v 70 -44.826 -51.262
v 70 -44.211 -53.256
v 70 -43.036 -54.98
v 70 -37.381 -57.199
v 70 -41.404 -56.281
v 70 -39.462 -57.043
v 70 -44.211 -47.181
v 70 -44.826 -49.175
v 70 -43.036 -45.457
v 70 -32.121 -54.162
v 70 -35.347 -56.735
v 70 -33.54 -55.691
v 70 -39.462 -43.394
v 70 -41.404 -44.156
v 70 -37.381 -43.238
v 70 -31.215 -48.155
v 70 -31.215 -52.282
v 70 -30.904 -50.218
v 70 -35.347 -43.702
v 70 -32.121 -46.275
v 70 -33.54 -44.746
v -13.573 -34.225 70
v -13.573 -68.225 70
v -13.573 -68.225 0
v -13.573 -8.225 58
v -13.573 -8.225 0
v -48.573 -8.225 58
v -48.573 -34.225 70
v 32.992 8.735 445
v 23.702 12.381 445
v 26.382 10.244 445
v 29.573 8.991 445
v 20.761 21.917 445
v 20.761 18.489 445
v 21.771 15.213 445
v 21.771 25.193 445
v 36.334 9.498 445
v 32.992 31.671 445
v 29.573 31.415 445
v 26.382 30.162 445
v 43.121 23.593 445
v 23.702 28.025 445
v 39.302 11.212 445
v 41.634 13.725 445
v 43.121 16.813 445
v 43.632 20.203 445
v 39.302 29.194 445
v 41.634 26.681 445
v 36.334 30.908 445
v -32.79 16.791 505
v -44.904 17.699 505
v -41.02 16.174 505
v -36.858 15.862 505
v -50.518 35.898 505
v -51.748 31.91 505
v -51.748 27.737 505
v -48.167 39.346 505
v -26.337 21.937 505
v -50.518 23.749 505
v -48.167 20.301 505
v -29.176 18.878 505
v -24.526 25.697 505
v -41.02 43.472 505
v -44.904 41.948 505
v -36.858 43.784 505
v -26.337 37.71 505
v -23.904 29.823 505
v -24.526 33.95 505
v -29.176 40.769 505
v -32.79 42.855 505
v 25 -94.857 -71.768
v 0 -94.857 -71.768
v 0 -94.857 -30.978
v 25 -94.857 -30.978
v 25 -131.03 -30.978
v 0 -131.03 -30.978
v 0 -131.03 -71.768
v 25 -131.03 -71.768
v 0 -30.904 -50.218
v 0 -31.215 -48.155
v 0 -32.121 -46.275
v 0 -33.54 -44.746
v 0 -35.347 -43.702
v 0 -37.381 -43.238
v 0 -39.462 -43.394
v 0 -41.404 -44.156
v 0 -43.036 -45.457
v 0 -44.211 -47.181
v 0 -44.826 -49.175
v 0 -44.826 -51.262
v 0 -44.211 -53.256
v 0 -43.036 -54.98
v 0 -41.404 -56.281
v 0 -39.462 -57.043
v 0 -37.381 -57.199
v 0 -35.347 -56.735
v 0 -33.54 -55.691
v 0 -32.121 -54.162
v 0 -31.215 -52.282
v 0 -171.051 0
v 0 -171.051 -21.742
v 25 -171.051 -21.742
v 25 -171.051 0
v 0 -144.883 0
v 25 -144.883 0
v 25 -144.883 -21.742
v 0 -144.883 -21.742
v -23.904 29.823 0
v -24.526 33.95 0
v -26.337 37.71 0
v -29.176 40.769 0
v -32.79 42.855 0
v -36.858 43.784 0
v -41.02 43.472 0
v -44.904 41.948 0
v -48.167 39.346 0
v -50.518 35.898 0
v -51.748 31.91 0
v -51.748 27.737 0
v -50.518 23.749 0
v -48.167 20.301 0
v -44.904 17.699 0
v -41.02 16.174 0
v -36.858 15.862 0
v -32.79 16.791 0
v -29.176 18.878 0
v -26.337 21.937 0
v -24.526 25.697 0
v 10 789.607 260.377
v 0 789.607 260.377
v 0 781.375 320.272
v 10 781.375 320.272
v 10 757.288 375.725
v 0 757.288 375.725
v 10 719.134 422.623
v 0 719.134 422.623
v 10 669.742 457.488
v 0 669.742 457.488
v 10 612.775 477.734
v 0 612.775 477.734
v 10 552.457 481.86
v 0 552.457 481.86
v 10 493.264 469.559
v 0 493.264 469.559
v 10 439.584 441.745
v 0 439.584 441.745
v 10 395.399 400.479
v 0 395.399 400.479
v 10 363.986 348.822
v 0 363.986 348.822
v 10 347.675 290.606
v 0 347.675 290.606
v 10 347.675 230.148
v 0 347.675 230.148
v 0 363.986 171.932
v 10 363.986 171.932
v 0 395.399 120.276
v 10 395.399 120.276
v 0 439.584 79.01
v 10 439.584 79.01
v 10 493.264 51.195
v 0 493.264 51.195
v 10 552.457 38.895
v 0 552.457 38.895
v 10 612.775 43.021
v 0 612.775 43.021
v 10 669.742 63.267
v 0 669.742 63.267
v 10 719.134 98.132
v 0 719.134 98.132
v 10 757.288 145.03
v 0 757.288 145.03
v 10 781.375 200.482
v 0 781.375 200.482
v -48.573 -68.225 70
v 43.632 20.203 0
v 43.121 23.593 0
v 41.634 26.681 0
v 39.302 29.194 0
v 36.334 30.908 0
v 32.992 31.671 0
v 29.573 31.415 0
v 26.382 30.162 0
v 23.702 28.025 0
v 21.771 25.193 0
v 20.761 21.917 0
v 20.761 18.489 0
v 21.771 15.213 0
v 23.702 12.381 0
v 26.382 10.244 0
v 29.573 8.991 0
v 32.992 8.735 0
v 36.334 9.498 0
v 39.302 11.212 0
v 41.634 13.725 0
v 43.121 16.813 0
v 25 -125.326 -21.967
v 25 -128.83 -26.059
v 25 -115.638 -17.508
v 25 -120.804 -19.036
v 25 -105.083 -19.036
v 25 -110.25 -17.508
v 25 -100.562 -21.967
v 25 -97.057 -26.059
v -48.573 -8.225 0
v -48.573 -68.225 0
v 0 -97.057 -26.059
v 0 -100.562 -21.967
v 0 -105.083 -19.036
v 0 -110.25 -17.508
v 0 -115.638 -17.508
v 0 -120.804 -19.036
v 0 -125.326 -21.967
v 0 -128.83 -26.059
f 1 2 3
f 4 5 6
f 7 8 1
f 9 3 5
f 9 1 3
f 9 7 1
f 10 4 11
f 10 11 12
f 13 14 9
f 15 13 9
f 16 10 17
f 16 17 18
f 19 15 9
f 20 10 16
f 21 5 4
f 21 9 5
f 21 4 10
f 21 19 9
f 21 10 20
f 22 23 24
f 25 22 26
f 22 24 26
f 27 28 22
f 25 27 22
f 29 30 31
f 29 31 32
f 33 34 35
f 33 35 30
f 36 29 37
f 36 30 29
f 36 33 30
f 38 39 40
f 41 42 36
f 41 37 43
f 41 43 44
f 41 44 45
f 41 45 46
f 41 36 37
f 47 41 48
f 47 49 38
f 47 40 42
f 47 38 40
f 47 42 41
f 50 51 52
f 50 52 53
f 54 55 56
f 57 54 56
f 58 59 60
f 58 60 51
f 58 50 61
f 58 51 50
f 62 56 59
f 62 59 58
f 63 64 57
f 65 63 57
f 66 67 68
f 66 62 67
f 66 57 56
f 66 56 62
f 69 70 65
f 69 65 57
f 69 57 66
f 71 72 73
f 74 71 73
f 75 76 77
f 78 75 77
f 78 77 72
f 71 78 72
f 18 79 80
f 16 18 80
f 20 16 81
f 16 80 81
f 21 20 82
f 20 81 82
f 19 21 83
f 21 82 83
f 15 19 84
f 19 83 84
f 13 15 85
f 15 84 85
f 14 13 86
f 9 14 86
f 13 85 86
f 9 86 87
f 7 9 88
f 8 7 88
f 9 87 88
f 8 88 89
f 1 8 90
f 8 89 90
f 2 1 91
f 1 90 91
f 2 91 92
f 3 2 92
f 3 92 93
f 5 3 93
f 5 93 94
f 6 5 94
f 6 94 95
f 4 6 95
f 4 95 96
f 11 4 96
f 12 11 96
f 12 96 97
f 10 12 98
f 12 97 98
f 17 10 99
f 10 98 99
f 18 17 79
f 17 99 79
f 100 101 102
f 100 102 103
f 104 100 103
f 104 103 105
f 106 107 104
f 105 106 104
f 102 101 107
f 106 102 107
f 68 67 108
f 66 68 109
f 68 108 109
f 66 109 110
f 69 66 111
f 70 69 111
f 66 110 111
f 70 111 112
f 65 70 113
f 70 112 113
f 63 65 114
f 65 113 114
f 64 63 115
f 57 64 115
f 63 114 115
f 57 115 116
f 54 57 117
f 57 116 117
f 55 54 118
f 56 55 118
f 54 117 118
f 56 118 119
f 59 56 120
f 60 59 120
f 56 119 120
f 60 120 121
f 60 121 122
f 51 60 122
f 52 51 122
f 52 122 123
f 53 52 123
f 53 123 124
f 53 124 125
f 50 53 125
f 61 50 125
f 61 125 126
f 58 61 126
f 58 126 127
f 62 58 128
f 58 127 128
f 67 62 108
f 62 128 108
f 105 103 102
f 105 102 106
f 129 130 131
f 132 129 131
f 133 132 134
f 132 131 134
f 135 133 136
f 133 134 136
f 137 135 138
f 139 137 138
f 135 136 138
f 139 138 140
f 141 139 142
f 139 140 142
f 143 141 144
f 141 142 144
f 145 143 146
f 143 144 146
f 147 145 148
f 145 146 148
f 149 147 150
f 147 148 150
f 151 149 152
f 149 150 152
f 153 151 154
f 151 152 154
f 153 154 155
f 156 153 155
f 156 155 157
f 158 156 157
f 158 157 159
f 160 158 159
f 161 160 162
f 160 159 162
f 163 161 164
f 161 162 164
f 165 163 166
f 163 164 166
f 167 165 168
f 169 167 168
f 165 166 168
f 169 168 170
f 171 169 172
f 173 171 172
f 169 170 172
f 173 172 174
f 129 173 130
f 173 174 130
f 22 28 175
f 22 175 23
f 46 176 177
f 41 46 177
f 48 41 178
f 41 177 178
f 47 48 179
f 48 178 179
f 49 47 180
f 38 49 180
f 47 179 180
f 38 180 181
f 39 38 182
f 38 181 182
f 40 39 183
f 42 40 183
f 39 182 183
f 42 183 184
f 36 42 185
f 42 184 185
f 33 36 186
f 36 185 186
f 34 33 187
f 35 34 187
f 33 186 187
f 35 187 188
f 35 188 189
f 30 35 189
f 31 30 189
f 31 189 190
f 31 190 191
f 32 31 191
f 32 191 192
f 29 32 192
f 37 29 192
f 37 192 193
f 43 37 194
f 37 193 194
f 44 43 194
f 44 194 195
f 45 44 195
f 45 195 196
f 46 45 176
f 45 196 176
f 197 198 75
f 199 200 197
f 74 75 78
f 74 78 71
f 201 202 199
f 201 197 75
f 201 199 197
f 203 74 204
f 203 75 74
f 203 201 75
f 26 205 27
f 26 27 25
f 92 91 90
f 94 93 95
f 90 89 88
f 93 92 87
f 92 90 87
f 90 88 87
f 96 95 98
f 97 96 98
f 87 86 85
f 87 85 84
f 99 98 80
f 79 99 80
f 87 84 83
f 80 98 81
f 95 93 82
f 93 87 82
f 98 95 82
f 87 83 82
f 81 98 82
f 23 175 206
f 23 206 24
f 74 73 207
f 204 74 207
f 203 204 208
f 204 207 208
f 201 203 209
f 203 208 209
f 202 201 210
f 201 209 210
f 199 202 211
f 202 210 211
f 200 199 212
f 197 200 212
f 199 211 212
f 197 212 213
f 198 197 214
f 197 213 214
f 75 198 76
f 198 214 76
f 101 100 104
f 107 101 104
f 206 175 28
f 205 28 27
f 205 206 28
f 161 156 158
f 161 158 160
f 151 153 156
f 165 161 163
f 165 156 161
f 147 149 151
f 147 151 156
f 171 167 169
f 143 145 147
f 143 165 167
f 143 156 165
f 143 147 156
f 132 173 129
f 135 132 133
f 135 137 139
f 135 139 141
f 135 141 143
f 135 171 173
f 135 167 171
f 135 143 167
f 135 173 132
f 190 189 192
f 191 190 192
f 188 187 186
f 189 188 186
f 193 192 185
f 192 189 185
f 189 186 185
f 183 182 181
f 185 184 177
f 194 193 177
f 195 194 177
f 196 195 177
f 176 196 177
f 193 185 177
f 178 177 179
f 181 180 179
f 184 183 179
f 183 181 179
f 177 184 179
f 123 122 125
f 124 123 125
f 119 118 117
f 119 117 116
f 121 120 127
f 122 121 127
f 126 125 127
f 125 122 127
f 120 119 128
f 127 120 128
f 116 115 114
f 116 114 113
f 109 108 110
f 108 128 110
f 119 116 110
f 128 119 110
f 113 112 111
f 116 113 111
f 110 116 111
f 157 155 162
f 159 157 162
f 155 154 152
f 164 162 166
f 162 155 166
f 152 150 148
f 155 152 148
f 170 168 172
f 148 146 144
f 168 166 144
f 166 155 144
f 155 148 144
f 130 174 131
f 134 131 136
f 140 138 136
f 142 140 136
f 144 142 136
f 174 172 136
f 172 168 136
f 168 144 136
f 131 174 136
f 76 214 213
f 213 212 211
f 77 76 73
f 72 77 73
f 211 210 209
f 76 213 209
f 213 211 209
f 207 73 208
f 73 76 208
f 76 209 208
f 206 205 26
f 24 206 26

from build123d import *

# Parameters (mm, degrees)
F0_R      = 14
F1_DEPTH  = 505
F2_R      = 11.5
F3_DEPTH  = 445
F4_W      = 35
F4_H      = 60
F5_DEPTH  = 70
F6_SIZE2  = 26
F6_SIZE   = 12
F7_R      = 7
F8_DEPTH  = 70
F11_DEPTH = 25
F10_W     = 26.167509
F10_H     = 21.742089
F12_DEPTH = 25
F13_R     = 222
F14_DEPTH = 10


with BuildPart() as f1:
    # F0 (on Top) → F1 (new body)
    with BuildSketch(Plane.XY):
        with Locations((-37.904397, 29.823253)):
            Circle(F0_R)
    extrude(amount=F1_DEPTH)


with BuildPart() as f3:
    # F2 (on Top) → F3 (new body)
    with BuildSketch(Plane.XY):
        with Locations((32.132167, 20.202847)):
            Circle(F2_R)
    extrude(amount=F3_DEPTH)


with BuildPart() as f5:
    # F4 (on Top) → F5 (new body)
    with BuildSketch(Plane.XY):
        with Locations((-31.072771, -38.224626)):
            Rectangle(F4_W, F4_H)
    extrude(amount=F5_DEPTH)

    # F6
    f6_edges = [f5.edges().sort_by_distance(p)[0] for p in [
        (-31.072771, -8.224626, 70),
    ]]
    chamfer(f6_edges, length=F6_SIZE, length2=F6_SIZE2)


with BuildPart() as f8:
    # F7 (on Right) → F8 (new body)
    with BuildSketch(Plane.YZ):
        with Locations((-37.9044, -50.218493)):
            Circle(F7_R)
    extrude(amount=F8_DEPTH)


with BuildPart() as f11:
    # F9 (on Right) → F11 (new body)
    with BuildSketch(Plane.YZ):
        with BuildLine():
            Line((-131.029932, -30.977678), (-131.029932, -71.768202))
            Line((-131.029932, -71.768202), (-94.857205, -71.768202))
            Line((-94.857205, -71.768202), (-94.857205, -30.977678))
            ThreePointArc((-94.857205, -30.977678), (-112.943568, -17.313983), (-131.029932, -30.977678))
        make_face()
    extrude(amount=F11_DEPTH)


with BuildPart() as f12:
    # F10 (on Right) → F12 (new body)
    with BuildSketch(Plane.YZ):
        with Locations((-157.967079, -10.871044)):
            Rectangle(F10_W, F10_H)
    extrude(amount=F12_DEPTH)


with BuildPart() as f14:
    # F13 (on Right) → F14 (new body)
    with BuildSketch(Plane.YZ):
        with Locations((567.607284, 260.377318)):
            Circle(F13_R)
    extrude(amount=F14_DEPTH)


solid = Compound([f1.part, f3.part, f5.part, f8.part, f11.part, f12.part, f14.part])
